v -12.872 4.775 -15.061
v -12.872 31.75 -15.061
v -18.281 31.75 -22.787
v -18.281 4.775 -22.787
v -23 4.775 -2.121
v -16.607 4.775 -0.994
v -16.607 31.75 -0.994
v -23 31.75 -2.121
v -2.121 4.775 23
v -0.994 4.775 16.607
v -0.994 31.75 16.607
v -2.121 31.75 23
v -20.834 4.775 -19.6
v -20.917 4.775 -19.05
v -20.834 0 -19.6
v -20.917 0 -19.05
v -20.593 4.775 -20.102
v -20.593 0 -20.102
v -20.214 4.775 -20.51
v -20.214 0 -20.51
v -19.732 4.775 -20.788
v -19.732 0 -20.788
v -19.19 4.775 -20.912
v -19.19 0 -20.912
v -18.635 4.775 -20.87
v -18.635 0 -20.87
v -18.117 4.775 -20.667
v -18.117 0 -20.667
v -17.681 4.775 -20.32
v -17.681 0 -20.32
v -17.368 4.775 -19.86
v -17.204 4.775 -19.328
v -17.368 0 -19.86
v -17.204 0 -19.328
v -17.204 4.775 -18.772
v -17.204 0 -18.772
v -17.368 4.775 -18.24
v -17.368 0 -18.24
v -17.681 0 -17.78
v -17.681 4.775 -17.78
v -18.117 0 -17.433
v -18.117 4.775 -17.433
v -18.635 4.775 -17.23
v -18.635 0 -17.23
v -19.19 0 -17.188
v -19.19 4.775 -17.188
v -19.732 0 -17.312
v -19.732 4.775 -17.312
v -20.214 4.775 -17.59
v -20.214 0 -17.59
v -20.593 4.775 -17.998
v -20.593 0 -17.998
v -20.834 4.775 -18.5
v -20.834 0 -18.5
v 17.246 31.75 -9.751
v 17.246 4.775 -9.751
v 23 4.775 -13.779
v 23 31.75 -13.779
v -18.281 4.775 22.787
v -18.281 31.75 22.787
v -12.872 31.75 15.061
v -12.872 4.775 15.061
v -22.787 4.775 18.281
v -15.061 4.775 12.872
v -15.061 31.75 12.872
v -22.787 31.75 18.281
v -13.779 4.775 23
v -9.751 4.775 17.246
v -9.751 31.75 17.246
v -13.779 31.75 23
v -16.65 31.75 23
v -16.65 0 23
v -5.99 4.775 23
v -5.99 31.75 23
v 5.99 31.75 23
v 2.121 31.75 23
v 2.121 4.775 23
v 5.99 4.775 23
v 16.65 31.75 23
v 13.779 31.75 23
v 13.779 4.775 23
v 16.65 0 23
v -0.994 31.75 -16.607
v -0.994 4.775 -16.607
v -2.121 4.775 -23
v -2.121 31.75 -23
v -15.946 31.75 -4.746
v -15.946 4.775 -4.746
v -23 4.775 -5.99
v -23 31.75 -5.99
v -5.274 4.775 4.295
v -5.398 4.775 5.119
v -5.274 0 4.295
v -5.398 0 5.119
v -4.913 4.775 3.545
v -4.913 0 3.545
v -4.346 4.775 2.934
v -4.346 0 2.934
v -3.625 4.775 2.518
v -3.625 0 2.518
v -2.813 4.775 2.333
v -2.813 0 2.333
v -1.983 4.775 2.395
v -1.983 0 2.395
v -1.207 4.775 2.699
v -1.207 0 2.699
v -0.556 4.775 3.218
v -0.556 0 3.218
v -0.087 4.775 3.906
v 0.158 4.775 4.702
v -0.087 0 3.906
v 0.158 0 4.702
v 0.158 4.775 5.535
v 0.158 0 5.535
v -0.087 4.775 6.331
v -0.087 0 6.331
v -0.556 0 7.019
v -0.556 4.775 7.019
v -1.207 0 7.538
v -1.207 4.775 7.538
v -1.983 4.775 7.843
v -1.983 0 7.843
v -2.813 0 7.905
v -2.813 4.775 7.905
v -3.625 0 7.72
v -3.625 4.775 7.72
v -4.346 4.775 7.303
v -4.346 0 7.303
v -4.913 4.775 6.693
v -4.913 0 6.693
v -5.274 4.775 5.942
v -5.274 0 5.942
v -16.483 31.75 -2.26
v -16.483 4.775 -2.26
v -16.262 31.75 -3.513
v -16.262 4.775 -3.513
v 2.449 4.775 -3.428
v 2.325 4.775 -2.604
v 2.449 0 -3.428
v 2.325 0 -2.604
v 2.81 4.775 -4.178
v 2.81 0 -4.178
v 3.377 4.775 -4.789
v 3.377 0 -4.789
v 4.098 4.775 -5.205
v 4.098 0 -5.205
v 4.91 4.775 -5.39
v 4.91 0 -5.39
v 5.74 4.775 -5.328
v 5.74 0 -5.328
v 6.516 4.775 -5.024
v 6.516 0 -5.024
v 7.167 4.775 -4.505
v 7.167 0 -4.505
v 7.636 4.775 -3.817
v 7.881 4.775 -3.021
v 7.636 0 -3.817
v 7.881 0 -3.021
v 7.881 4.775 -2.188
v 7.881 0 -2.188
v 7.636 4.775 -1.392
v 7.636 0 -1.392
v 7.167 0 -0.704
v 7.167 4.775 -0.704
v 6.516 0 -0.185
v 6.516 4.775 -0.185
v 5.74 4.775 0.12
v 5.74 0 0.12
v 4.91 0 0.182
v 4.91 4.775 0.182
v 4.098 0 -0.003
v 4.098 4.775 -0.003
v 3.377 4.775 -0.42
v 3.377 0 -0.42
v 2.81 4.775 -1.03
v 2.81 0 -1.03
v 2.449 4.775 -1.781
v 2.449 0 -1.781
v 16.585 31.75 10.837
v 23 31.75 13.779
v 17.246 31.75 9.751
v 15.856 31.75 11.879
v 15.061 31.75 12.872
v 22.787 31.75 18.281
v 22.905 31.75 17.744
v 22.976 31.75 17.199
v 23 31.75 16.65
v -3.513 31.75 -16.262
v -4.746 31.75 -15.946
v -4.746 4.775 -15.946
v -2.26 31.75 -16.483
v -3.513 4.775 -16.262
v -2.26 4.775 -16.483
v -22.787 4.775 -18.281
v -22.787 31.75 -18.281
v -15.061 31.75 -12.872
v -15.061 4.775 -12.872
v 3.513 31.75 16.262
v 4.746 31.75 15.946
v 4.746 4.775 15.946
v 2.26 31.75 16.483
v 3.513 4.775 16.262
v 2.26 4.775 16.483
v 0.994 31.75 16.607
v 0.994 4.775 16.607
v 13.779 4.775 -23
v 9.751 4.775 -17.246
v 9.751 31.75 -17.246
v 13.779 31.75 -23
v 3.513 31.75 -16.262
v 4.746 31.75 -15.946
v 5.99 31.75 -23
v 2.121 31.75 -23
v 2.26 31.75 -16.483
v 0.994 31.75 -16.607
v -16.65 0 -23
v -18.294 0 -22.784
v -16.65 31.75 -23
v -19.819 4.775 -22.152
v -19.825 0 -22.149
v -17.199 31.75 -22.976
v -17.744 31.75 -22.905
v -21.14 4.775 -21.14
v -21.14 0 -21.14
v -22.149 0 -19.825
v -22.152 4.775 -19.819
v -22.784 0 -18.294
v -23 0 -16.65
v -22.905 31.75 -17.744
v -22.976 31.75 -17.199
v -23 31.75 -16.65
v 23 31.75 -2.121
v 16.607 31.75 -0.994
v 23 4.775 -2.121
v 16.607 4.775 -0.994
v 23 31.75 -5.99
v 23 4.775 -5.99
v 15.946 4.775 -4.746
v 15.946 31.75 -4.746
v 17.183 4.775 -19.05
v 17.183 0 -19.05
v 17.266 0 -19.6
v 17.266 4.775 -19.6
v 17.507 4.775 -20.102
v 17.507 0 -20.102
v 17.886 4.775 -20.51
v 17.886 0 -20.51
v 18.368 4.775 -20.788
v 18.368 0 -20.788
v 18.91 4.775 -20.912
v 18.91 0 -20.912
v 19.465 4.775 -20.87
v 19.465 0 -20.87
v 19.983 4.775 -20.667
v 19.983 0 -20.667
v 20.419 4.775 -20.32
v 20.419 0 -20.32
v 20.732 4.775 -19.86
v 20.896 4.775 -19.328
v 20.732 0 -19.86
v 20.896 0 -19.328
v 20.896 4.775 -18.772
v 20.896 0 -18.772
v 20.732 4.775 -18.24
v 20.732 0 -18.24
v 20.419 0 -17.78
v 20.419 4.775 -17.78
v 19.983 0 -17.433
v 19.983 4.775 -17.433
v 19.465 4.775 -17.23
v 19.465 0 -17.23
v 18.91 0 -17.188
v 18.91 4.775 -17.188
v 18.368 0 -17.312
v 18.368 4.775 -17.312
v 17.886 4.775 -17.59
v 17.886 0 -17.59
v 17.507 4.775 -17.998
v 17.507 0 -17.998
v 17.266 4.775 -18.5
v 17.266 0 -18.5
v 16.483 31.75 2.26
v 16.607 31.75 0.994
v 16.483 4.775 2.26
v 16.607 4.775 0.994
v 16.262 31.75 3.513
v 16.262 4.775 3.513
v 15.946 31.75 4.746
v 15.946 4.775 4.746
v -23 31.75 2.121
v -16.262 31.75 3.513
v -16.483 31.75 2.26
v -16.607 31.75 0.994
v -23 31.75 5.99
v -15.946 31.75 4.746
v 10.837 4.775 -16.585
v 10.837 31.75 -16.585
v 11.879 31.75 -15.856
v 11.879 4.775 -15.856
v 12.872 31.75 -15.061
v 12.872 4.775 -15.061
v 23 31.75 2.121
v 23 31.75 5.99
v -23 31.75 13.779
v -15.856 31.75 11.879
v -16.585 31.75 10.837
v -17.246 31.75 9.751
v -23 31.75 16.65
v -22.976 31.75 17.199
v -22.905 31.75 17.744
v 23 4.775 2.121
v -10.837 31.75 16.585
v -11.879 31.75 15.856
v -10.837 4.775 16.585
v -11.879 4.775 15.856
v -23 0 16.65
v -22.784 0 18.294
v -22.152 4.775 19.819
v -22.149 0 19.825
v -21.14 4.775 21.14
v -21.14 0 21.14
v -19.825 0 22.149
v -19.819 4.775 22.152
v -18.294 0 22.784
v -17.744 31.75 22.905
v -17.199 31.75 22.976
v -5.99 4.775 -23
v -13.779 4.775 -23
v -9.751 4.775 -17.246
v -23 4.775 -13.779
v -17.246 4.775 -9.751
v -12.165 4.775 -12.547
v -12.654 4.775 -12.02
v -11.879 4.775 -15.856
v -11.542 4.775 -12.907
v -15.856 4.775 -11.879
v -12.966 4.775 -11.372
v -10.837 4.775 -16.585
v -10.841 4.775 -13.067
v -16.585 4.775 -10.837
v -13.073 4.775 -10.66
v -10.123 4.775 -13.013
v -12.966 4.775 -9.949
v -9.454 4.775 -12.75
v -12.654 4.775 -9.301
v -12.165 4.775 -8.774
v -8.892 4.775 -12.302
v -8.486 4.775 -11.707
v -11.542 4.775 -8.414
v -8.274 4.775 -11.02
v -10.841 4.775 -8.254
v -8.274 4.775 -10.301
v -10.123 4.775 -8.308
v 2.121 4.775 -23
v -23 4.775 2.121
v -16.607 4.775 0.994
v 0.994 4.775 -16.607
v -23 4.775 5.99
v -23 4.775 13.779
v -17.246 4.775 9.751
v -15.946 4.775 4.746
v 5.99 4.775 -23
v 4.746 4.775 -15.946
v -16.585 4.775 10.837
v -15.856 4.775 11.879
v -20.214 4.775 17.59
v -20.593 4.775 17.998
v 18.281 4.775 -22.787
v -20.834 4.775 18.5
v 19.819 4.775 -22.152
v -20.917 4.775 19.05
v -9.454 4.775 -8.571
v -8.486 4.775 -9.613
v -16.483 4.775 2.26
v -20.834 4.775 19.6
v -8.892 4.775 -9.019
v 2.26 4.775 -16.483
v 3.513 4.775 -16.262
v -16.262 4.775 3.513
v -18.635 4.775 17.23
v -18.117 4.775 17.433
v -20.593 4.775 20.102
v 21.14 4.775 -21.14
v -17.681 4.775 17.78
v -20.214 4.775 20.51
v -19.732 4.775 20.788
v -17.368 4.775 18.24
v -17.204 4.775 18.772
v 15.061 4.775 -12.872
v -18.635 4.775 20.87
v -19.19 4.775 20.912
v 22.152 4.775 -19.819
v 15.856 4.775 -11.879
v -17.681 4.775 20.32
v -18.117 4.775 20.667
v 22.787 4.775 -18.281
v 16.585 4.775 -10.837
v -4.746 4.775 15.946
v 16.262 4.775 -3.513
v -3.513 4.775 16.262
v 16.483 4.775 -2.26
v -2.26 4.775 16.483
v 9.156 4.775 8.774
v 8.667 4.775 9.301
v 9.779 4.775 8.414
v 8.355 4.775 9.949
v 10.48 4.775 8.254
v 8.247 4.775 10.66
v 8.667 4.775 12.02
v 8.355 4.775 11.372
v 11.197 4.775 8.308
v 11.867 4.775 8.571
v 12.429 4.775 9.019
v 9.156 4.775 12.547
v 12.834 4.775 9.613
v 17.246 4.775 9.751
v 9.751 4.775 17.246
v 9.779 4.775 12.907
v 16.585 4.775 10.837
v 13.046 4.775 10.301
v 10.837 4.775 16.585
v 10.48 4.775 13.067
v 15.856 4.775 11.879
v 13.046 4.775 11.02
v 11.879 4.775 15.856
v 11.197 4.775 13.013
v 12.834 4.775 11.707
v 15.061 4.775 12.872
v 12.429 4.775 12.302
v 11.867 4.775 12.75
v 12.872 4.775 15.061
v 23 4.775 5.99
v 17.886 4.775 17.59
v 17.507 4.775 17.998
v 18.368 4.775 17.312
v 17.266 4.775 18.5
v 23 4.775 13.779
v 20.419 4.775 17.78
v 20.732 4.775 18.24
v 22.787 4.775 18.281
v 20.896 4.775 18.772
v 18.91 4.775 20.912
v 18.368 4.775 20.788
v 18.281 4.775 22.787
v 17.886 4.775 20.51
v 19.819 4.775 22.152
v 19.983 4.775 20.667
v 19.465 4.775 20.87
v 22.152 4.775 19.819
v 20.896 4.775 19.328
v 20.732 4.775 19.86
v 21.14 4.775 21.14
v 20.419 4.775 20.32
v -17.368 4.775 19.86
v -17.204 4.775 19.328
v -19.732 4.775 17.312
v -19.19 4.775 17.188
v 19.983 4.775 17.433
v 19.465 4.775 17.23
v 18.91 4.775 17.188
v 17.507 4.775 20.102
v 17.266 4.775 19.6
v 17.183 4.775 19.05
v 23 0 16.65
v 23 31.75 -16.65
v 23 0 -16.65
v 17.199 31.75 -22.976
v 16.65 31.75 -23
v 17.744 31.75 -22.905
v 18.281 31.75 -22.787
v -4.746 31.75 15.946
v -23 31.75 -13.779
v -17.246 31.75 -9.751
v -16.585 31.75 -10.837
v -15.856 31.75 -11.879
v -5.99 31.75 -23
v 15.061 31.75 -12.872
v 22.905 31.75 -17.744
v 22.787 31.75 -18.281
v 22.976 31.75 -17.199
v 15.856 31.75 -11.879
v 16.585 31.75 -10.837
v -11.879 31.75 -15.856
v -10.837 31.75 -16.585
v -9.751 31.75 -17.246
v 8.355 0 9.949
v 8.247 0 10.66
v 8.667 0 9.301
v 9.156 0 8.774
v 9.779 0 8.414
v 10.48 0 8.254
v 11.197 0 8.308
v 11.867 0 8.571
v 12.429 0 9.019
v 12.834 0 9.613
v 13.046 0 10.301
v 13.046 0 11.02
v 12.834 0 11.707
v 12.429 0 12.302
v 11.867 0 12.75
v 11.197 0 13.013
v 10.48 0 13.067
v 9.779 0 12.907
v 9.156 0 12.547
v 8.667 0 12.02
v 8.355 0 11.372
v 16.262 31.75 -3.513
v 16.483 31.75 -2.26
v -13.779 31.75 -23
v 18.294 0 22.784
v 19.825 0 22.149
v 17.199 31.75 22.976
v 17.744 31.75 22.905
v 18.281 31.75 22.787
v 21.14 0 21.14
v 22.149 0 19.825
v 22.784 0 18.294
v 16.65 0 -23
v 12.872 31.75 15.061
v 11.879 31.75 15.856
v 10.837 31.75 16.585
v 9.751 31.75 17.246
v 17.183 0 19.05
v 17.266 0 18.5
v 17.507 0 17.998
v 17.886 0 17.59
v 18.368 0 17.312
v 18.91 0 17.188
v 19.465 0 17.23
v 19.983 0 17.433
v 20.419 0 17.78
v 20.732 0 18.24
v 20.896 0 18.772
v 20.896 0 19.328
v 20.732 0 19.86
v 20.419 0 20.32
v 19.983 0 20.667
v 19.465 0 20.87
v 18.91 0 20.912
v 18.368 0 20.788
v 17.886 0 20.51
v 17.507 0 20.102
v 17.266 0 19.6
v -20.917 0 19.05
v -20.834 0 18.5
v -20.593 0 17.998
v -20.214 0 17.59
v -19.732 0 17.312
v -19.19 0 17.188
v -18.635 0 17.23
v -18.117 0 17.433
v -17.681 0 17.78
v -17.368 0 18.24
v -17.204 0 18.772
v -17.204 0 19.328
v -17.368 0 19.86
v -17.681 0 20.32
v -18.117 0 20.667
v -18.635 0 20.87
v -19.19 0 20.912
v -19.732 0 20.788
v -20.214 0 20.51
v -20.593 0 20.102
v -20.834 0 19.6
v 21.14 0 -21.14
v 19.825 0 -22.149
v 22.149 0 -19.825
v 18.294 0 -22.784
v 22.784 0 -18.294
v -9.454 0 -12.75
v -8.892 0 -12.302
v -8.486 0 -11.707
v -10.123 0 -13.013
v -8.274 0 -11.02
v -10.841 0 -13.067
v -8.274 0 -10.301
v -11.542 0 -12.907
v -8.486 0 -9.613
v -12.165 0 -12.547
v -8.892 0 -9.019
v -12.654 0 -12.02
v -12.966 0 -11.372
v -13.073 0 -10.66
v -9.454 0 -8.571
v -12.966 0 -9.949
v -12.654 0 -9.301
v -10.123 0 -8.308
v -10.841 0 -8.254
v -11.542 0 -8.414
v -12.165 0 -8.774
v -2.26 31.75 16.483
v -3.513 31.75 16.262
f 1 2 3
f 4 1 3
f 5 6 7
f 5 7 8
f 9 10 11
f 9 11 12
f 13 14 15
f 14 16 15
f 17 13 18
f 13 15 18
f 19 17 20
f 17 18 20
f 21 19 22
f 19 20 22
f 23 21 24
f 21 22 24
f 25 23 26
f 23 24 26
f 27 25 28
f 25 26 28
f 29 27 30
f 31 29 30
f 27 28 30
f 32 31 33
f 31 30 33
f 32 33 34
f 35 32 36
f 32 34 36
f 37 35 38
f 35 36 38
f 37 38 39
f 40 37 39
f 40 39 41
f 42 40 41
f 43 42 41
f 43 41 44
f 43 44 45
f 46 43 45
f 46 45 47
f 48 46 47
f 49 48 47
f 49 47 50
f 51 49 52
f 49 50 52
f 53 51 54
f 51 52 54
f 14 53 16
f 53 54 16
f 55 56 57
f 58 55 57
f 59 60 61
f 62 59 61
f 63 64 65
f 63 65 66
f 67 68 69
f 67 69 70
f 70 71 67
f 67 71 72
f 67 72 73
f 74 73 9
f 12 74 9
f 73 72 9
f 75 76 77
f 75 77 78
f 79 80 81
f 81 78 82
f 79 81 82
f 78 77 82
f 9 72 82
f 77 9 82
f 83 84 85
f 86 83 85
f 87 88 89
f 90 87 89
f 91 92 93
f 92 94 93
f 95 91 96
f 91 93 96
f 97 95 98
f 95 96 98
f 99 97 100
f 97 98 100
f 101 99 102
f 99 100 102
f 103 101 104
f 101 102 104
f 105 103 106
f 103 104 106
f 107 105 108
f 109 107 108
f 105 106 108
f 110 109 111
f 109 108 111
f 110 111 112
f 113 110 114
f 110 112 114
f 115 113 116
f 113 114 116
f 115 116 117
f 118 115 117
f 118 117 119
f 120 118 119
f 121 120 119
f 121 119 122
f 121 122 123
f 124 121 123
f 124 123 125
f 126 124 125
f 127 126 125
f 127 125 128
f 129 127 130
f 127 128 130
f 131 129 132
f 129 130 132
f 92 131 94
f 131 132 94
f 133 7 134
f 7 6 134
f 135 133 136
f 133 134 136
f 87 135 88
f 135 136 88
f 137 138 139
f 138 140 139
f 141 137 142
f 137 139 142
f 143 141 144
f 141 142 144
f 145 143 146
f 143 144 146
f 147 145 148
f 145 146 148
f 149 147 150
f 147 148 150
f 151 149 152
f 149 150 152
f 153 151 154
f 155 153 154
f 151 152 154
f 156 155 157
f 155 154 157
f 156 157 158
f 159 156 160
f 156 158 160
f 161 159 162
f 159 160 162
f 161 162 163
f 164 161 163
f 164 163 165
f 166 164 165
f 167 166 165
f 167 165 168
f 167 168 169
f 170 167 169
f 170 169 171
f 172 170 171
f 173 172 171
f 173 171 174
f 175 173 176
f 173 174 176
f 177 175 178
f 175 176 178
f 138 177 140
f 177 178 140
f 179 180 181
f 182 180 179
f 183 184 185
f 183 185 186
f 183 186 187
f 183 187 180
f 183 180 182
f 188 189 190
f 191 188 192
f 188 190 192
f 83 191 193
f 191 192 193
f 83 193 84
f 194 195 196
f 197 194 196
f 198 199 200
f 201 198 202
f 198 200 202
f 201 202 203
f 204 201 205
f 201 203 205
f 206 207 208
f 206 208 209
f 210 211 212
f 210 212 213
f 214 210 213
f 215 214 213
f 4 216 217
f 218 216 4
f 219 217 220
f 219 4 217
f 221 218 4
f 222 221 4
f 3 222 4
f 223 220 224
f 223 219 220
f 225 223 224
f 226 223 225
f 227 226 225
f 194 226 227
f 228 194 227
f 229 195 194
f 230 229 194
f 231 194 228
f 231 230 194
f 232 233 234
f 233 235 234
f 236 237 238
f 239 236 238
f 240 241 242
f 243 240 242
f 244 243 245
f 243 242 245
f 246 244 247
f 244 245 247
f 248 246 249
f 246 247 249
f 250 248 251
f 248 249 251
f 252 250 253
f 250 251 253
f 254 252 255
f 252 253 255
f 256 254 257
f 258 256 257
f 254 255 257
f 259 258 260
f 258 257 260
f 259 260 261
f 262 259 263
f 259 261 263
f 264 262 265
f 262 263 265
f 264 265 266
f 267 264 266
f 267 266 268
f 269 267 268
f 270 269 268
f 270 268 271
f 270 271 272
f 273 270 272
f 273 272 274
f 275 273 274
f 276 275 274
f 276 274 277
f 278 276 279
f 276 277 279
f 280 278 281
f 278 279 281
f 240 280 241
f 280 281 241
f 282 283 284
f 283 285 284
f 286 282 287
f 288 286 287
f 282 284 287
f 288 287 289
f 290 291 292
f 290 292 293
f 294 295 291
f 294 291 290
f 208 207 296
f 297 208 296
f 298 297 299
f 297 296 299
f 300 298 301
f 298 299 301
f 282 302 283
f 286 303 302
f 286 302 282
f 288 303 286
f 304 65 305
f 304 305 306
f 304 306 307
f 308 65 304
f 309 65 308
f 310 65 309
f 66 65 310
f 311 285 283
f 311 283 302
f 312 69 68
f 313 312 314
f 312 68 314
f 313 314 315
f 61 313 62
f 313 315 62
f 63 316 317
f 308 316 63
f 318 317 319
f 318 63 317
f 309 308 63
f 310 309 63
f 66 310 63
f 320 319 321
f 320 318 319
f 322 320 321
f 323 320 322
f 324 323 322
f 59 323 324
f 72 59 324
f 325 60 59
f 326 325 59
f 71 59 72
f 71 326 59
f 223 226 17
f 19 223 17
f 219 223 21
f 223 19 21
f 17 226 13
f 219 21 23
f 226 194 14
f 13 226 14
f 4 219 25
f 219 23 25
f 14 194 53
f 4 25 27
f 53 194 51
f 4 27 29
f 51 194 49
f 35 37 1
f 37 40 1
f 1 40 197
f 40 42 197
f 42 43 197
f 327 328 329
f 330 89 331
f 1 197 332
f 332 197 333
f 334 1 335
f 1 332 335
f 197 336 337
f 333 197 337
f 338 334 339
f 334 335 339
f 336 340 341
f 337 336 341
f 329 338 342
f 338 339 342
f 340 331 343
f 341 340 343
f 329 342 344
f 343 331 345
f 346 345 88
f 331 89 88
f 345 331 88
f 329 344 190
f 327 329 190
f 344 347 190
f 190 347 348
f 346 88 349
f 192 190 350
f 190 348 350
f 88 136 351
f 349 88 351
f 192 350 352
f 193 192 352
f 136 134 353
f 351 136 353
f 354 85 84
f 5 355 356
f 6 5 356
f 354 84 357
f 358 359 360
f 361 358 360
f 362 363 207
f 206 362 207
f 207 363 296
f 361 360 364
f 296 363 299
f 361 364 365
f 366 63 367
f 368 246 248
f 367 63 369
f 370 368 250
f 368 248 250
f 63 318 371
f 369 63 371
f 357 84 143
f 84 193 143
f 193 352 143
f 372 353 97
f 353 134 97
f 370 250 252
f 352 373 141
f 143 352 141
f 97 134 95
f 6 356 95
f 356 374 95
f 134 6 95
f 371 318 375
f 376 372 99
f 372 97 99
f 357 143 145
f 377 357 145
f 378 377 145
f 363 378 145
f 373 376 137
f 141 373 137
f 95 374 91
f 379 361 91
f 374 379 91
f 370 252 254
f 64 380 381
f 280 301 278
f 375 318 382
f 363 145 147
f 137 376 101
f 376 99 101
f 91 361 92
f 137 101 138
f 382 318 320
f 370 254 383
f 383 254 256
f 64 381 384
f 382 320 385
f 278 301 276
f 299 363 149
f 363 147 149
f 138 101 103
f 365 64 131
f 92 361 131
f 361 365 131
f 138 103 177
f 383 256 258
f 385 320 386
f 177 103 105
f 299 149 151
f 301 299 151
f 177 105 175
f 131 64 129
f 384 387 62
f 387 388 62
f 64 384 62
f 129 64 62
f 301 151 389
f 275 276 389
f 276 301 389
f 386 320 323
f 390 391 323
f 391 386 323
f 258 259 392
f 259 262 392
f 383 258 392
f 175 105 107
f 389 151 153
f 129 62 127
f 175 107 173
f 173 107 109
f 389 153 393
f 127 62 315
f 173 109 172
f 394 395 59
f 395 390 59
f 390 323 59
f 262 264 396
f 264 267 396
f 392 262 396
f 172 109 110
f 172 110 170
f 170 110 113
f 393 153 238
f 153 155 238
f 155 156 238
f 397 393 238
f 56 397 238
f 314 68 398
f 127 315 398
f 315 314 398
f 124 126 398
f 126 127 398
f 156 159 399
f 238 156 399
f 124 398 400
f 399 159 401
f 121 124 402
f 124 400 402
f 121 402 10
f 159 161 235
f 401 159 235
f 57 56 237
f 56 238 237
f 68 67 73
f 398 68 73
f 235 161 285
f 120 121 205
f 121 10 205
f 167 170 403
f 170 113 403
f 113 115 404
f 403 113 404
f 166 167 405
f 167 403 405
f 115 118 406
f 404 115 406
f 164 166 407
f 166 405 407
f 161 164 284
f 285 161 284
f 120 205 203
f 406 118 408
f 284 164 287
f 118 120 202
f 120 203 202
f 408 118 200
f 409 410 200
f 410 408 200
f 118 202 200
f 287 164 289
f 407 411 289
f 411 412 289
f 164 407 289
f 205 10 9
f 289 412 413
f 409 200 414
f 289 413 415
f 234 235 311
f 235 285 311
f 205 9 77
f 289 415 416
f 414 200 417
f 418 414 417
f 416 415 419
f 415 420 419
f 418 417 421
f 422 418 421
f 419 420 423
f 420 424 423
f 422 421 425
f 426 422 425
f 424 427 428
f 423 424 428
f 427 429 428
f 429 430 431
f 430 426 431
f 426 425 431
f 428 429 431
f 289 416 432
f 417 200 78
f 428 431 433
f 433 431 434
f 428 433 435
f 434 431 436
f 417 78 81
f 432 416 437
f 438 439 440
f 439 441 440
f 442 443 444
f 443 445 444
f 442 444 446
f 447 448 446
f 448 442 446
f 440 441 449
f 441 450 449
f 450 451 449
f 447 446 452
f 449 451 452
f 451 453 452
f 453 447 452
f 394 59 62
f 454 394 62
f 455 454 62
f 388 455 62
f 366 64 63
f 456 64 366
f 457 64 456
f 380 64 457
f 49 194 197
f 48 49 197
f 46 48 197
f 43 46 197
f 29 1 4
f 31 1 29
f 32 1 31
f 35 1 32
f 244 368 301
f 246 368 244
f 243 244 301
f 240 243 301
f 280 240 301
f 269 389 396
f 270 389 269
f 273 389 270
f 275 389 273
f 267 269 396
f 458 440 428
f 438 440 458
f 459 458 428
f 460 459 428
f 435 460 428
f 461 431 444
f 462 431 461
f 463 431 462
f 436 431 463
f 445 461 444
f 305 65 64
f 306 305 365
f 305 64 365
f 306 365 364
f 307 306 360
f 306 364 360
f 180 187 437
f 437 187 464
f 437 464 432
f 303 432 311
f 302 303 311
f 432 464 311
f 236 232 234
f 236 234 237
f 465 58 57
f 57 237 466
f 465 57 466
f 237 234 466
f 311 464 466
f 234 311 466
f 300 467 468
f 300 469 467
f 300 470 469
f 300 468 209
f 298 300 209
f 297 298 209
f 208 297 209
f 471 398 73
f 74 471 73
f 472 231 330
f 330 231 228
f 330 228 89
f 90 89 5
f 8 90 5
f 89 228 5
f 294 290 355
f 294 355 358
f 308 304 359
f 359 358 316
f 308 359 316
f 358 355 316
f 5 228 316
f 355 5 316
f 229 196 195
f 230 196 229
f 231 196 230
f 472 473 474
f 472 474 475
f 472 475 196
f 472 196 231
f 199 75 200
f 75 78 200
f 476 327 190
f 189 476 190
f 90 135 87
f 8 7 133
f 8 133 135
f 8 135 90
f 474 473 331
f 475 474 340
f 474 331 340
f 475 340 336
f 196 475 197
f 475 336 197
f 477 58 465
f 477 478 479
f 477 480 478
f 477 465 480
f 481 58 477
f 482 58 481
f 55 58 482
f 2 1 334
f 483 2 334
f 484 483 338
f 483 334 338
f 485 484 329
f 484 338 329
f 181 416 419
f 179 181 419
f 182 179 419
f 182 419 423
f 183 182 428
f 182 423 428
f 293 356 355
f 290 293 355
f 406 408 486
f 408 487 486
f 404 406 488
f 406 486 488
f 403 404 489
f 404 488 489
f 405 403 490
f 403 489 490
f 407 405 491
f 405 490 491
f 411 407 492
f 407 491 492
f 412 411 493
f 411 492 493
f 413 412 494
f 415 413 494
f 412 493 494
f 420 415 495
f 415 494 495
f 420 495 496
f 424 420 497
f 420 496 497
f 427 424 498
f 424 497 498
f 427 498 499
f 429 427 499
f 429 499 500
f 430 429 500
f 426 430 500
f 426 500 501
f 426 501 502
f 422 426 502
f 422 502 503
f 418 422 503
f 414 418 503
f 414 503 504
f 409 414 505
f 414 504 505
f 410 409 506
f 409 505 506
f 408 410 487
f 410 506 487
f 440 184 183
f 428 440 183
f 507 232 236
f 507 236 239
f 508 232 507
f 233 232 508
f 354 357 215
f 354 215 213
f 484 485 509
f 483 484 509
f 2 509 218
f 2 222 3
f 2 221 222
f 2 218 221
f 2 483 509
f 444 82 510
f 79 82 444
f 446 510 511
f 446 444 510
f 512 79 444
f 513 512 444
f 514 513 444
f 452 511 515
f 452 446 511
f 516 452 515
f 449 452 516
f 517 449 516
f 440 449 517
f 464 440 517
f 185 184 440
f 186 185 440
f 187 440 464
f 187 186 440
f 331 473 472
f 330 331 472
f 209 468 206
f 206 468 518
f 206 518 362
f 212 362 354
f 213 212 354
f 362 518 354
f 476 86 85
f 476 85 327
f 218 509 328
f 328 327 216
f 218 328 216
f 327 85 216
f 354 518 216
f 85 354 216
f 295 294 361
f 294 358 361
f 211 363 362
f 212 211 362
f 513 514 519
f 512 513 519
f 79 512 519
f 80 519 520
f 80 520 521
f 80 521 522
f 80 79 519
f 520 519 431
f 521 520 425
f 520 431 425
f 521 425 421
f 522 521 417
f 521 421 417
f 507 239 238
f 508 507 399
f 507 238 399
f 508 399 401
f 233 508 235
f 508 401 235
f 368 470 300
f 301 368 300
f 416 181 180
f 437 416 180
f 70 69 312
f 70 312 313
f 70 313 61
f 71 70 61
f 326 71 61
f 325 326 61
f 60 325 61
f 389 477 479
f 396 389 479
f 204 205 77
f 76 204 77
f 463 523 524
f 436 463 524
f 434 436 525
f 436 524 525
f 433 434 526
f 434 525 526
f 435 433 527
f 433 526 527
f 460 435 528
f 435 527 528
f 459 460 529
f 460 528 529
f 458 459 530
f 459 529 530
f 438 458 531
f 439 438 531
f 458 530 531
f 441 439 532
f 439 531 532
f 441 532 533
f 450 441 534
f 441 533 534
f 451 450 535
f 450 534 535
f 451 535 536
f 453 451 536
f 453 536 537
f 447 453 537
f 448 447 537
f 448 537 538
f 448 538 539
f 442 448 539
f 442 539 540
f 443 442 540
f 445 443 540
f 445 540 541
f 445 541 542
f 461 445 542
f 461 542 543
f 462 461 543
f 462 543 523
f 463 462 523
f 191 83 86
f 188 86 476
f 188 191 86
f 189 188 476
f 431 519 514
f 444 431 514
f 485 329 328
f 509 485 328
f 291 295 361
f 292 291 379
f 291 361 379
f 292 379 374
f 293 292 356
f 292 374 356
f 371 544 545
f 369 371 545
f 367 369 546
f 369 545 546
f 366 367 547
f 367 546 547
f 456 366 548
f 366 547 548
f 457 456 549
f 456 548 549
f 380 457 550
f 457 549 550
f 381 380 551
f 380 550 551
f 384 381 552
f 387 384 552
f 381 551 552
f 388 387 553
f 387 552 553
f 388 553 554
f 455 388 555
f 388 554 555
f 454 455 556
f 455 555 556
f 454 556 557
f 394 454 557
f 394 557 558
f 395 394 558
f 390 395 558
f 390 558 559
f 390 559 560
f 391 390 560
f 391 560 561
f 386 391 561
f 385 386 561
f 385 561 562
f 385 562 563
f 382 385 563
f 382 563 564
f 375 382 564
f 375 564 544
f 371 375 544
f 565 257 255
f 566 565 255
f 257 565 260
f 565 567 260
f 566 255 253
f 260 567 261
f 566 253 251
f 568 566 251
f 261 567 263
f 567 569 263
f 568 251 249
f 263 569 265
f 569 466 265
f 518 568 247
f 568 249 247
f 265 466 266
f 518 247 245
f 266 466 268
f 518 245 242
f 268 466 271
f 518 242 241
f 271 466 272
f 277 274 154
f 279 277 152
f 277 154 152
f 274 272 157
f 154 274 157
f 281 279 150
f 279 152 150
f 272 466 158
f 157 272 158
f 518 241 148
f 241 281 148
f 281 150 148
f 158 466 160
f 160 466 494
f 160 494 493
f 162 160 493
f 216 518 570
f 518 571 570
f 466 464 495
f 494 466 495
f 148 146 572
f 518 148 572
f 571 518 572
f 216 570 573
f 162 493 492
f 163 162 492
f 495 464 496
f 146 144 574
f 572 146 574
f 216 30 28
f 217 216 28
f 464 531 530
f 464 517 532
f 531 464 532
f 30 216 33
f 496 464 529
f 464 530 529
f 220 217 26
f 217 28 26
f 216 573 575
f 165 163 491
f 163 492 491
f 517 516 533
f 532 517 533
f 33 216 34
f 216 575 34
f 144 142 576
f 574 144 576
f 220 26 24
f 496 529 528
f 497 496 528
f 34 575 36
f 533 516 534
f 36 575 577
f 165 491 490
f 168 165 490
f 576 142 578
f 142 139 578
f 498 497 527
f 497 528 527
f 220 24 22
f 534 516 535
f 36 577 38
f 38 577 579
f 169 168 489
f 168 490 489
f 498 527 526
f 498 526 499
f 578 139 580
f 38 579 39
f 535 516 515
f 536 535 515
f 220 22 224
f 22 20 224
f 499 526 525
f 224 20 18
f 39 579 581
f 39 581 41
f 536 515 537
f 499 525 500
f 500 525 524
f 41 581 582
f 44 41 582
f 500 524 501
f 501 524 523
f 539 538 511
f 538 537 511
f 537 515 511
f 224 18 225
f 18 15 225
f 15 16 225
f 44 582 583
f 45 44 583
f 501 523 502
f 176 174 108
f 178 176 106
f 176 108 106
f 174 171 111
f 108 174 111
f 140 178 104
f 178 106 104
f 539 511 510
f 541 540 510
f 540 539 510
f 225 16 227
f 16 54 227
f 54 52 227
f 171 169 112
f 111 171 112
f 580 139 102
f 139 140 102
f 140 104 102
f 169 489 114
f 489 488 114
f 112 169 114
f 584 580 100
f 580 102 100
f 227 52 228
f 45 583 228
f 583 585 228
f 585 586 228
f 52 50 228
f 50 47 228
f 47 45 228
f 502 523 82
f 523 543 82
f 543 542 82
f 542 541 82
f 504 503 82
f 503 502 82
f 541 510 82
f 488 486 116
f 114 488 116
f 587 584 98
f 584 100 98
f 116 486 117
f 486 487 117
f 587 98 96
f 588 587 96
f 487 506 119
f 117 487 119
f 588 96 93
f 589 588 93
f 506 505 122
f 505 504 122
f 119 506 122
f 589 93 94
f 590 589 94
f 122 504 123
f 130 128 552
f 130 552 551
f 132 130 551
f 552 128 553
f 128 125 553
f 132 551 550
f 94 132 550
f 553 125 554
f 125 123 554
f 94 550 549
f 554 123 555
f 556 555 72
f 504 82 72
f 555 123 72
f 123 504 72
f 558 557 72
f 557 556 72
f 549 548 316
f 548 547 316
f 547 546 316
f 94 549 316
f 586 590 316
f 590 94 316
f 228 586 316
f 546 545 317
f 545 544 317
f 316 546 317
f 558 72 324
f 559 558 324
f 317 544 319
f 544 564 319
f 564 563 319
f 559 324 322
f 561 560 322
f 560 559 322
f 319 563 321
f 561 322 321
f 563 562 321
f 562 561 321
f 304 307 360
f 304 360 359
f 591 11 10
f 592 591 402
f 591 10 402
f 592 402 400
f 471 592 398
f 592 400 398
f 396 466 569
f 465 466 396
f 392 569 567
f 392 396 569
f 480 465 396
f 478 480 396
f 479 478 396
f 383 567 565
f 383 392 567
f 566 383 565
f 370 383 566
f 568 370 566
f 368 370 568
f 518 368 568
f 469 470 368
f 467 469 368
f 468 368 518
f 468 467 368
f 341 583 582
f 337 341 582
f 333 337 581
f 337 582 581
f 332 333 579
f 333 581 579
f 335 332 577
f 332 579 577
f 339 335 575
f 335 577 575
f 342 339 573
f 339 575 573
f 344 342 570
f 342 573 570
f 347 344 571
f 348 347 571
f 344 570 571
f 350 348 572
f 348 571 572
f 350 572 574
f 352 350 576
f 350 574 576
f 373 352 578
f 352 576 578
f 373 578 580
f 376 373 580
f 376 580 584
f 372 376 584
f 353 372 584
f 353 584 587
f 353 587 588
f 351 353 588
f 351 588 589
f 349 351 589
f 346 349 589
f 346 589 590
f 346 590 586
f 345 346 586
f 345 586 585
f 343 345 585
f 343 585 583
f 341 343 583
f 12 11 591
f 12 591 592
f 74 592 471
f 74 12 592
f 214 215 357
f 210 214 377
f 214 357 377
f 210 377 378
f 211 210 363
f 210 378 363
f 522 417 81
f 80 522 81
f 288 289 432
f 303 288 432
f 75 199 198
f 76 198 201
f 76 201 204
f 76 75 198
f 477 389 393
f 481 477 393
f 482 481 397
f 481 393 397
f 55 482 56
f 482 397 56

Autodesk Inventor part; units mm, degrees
ref_plane "YZ Plane" through (0, 0, 0) normal (1, 0, 0) x (0, 1, 0)
ref_plane "XZ Plane" through (0, 0, 0) normal (0, 1, 0) x (-1, 0, 0)
sketch "Sketch2" plane through (0, 0, 0) normal (0, 1, 0) x (-1, 0, 0)
  line L0 (23, 23) -> (-23, 23)
  line L1 (-23, 23) -> (-23, -23)
  line L2 (-23, -23) -> (23, -23)
  line L3 (23, -23) -> (23, 23)
  line L4 (23, 23) -> (-23, -23) construction
  line L5 (-23, 23) -> (23, -23) construction
  circle A0 centre (19.05, -19.05) radius 1.8669
  line L6 (0, -32.2) -> (0, 32.2) construction
  line L7 (-32.2, 0) -> (32.2, 0) construction
  circle A1 centre (-19.05, -19.05) radius 1.8669
  circle A2 centre (19.05, 19.05) radius 1.8669
  circle A3 centre (-19.05, 19.05) radius 1.8669
  circle A4 centre (-5.1187, -2.6043) radius 2.794
  circle A5 centre (2.6043, 5.1187) radius 2.794
  circle A6 centre (10.6604, -10.6604) radius 2.413
  circle A7 centre (-10.6604, 10.6604) radius 2.413
  line L8 (2.6043, 5.1187) -> (-5.1187, -2.6043) construction
  point P0 (0, 0)
  point P1 (-1.2572, 1.2572)
  dimension "d4" = 46
  dimension "d5" = 46
  dimension "d8" = 38.1
  dimension "d11" = 38.1
  dimension "d14" = 3.7338
  dimension "d15" = 5.588
  dimension "d16" = 4.826
  dimension "d17" = 30.1521
  dimension "d18" = 15.0761
  dimension "d19" = 10.922
  dimension "d20" = 1.778
extrude "Extrusion1" add sketch "Sketch2" along normal blind 31.75 contours L3 L2 L1 L0 | A0 | A1 | A2 | A3 | A4 | A5 | A6 | A7
fillet "Fillet1" radius 6.35 4 edges at (-23, 15.875, 23) (-23, 15.875, -23) (23, 15.875, 23) (23, 15.875, -23)
ref_plane "Work Plane1" through (0, 4.7752, 0) normal (0, -1, 0) x (1, 0, 0)
sketch "Sketch3" plane through (0, 4.7752, 0) normal (0, -1, 0) x (1, 0, 0)
  circle A0 centre (0, 0) radius 19.812
  circle A1 centre (0, 0) radius 16.637
  line L0 (23, 16.65) -> (23, -16.65) construction
  line L1 (23, -5.9899) -> (15.9457, -4.746)
  line L2 (16.6073, -0.9939) -> (23, -2.1211)
  line L3 (16.6073, 0.9939) -> (23, 2.1211)
  line L4 (15.9457, 4.746) -> (23, 5.9899)
  line L5 (-36.211, 0) -> (36.9584, 0) construction
  line L6 (16.3842, -2.889) -> (23, -4.0555) construction
  line L7 (23, -2.1211) -> (23, 2.1211)
  line L8 (9.7506, -17.2465) -> (13.7792, -23)
  line L9 (16.65, -23) -> (-16.65, -23) construction
  line L10 (18.4303, -23) -> (12.8715, -15.0612)
  line L11 (15.0612, -12.8715) -> (23, -18.4303)
  line L12 (17.2465, -9.7506) -> (23, -13.7792)
  line L13 (0, 36.211) -> (0, -36.9584) construction
  line L14 (0, 0) -> (26.5056, -26.5056) construction
  line L15 (16.1048, -23) -> (11.3637, -16.229) construction
  arc A2 (18.4303, -23) -> (23, -18.4303) centre (21.1181, -21.1181) ccw
  line L16 (23, -13.7792) -> (23, -5.9899)
  line L17 (0.9939, 16.6073) -> (2.1211, 23)
  line L18 (5.9899, 23) -> (4.746, 15.9457)
  line L19 (2.1211, 23) -> (-2.1211, 23)
  line L20 (-0.9939, 16.6073) -> (-2.1211, 23)
  line L21 (-4.746, 15.9457) -> (-5.9899, 23)
  line L22 (13.7792, 23) -> (5.9899, 23)
  line L23 (9.7506, 17.2465) -> (13.7792, 23)
  line L24 (12.8715, 15.0612) -> (18.4303, 23)
  line L25 (23, 18.4303) -> (15.0612, 12.8715)
  line L26 (17.2465, 9.7506) -> (23, 13.7792)
  arc A3 (23, 18.4303) -> (18.4303, 23) centre (21.1181, 21.1181) ccw
  line L27 (-16.6073, 0.9939) -> (-23, 2.1211)
  line L28 (-23, 5.9899) -> (-15.9457, 4.746)
  line L29 (-23, 2.1211) -> (-23, -2.1211)
  line L30 (-16.6073, -0.9939) -> (-23, -2.1211)
  line L31 (-15.9457, -4.746) -> (-23, -5.9899)
  line L32 (-23, 13.7792) -> (-23, 5.9899)
  line L33 (-17.2465, 9.7506) -> (-23, 13.7792)
  line L34 (-15.0612, 12.8715) -> (-23, 18.4303)
  line L35 (-18.4303, 23) -> (-12.8715, 15.0612)
  line L36 (-9.7506, 17.2465) -> (-13.7792, 23)
  arc A4 (-18.4303, 23) -> (-23, 18.4303) centre (-21.1181, 21.1181) ccw
  line L37 (-0.9939, -16.6073) -> (-2.1211, -23)
  line L38 (-5.9899, -23) -> (-4.746, -15.9457)
  line L39 (-2.1211, -23) -> (2.1211, -23)
  line L40 (0.9939, -16.6073) -> (2.1211, -23)
  line L41 (4.746, -15.9457) -> (5.9899, -23)
  line L42 (-13.7792, -23) -> (-5.9899, -23)
  line L43 (-9.7506, -17.2465) -> (-13.7792, -23)
  line L44 (-12.8715, -15.0612) -> (-18.4303, -23)
  line L45 (-23, -18.4303) -> (-15.0612, -12.8715)
  line L46 (-17.2465, -9.7506) -> (-23, -13.7792)
  arc A5 (-23, -18.4303) -> (-18.4303, -23) centre (-21.1181, -21.1181) ccw
  line L47 (23, 5.9899) -> (23, 13.7792)
  line L48 (-5.9899, 23) -> (-13.7792, 23)
  line L49 (-23, -5.9899) -> (-23, -13.7792)
  line L50 (-23, -16.65) -> (-23, 16.65) construction
  line L51 (13.7792, -23) -> (5.9899, -23)
  point P0 (19.0898, 5.3004)
  dimension "d25" = 39.624
  dimension "d26" = 33.274
  dimension "d27" = 3.81
  dimension "d28" = 3.81
  dimension "d29" = 20
  dimension "d30" = 45
  dimension "d31" = 3.81
  dimension "d32" = 3.81
  dimension "d33" = 20
  dimension "d41" = 360
extrude "Extrusion2" cut sketch "Sketch3" against normal blind 31.75 contours A0 L4 A1 L18 | L26 L47 L4 A0 | A0 L24 A3 L25 | L3 L7 L2 A0 | A0 L2 A1 L3 | A1 | A0 L18 L22 L23 | A1 L20 A0 L17 | A0 L20 L19 L17 | L1 L16 L12 A0 | A0 L41 A1 L1 | A1 L28 A0 L21 | A0 L36 L48 L21 | L11 A2 L10 A0 | L40 A0 L37 A1 | A0 L8 L51 L41 | A1 L30 A0 L27 | L28 L32 L33 A0 | A0 L34 A4 L35 | L40 L39 L37 A0 | A0 L30 L29 L27 | L38 A0 L31 A1 | L38 L42 L43 A0 | A0 L46 L49 L31 | L44 A5 L45 A0
extrude "Extrusion3" cut sketch "Sketch2" along normal through all contours A0 | A1 | A2 | A3 | A4 | A5 | A6 | A7
equation "\"d18\" = 0.5 * d17"
equation "\"d28\" = d27"
equation "\"d31\" = d27"
equation "\"d32\" = d27"
properties part number "680-125K" material "Aluminum-5052"
